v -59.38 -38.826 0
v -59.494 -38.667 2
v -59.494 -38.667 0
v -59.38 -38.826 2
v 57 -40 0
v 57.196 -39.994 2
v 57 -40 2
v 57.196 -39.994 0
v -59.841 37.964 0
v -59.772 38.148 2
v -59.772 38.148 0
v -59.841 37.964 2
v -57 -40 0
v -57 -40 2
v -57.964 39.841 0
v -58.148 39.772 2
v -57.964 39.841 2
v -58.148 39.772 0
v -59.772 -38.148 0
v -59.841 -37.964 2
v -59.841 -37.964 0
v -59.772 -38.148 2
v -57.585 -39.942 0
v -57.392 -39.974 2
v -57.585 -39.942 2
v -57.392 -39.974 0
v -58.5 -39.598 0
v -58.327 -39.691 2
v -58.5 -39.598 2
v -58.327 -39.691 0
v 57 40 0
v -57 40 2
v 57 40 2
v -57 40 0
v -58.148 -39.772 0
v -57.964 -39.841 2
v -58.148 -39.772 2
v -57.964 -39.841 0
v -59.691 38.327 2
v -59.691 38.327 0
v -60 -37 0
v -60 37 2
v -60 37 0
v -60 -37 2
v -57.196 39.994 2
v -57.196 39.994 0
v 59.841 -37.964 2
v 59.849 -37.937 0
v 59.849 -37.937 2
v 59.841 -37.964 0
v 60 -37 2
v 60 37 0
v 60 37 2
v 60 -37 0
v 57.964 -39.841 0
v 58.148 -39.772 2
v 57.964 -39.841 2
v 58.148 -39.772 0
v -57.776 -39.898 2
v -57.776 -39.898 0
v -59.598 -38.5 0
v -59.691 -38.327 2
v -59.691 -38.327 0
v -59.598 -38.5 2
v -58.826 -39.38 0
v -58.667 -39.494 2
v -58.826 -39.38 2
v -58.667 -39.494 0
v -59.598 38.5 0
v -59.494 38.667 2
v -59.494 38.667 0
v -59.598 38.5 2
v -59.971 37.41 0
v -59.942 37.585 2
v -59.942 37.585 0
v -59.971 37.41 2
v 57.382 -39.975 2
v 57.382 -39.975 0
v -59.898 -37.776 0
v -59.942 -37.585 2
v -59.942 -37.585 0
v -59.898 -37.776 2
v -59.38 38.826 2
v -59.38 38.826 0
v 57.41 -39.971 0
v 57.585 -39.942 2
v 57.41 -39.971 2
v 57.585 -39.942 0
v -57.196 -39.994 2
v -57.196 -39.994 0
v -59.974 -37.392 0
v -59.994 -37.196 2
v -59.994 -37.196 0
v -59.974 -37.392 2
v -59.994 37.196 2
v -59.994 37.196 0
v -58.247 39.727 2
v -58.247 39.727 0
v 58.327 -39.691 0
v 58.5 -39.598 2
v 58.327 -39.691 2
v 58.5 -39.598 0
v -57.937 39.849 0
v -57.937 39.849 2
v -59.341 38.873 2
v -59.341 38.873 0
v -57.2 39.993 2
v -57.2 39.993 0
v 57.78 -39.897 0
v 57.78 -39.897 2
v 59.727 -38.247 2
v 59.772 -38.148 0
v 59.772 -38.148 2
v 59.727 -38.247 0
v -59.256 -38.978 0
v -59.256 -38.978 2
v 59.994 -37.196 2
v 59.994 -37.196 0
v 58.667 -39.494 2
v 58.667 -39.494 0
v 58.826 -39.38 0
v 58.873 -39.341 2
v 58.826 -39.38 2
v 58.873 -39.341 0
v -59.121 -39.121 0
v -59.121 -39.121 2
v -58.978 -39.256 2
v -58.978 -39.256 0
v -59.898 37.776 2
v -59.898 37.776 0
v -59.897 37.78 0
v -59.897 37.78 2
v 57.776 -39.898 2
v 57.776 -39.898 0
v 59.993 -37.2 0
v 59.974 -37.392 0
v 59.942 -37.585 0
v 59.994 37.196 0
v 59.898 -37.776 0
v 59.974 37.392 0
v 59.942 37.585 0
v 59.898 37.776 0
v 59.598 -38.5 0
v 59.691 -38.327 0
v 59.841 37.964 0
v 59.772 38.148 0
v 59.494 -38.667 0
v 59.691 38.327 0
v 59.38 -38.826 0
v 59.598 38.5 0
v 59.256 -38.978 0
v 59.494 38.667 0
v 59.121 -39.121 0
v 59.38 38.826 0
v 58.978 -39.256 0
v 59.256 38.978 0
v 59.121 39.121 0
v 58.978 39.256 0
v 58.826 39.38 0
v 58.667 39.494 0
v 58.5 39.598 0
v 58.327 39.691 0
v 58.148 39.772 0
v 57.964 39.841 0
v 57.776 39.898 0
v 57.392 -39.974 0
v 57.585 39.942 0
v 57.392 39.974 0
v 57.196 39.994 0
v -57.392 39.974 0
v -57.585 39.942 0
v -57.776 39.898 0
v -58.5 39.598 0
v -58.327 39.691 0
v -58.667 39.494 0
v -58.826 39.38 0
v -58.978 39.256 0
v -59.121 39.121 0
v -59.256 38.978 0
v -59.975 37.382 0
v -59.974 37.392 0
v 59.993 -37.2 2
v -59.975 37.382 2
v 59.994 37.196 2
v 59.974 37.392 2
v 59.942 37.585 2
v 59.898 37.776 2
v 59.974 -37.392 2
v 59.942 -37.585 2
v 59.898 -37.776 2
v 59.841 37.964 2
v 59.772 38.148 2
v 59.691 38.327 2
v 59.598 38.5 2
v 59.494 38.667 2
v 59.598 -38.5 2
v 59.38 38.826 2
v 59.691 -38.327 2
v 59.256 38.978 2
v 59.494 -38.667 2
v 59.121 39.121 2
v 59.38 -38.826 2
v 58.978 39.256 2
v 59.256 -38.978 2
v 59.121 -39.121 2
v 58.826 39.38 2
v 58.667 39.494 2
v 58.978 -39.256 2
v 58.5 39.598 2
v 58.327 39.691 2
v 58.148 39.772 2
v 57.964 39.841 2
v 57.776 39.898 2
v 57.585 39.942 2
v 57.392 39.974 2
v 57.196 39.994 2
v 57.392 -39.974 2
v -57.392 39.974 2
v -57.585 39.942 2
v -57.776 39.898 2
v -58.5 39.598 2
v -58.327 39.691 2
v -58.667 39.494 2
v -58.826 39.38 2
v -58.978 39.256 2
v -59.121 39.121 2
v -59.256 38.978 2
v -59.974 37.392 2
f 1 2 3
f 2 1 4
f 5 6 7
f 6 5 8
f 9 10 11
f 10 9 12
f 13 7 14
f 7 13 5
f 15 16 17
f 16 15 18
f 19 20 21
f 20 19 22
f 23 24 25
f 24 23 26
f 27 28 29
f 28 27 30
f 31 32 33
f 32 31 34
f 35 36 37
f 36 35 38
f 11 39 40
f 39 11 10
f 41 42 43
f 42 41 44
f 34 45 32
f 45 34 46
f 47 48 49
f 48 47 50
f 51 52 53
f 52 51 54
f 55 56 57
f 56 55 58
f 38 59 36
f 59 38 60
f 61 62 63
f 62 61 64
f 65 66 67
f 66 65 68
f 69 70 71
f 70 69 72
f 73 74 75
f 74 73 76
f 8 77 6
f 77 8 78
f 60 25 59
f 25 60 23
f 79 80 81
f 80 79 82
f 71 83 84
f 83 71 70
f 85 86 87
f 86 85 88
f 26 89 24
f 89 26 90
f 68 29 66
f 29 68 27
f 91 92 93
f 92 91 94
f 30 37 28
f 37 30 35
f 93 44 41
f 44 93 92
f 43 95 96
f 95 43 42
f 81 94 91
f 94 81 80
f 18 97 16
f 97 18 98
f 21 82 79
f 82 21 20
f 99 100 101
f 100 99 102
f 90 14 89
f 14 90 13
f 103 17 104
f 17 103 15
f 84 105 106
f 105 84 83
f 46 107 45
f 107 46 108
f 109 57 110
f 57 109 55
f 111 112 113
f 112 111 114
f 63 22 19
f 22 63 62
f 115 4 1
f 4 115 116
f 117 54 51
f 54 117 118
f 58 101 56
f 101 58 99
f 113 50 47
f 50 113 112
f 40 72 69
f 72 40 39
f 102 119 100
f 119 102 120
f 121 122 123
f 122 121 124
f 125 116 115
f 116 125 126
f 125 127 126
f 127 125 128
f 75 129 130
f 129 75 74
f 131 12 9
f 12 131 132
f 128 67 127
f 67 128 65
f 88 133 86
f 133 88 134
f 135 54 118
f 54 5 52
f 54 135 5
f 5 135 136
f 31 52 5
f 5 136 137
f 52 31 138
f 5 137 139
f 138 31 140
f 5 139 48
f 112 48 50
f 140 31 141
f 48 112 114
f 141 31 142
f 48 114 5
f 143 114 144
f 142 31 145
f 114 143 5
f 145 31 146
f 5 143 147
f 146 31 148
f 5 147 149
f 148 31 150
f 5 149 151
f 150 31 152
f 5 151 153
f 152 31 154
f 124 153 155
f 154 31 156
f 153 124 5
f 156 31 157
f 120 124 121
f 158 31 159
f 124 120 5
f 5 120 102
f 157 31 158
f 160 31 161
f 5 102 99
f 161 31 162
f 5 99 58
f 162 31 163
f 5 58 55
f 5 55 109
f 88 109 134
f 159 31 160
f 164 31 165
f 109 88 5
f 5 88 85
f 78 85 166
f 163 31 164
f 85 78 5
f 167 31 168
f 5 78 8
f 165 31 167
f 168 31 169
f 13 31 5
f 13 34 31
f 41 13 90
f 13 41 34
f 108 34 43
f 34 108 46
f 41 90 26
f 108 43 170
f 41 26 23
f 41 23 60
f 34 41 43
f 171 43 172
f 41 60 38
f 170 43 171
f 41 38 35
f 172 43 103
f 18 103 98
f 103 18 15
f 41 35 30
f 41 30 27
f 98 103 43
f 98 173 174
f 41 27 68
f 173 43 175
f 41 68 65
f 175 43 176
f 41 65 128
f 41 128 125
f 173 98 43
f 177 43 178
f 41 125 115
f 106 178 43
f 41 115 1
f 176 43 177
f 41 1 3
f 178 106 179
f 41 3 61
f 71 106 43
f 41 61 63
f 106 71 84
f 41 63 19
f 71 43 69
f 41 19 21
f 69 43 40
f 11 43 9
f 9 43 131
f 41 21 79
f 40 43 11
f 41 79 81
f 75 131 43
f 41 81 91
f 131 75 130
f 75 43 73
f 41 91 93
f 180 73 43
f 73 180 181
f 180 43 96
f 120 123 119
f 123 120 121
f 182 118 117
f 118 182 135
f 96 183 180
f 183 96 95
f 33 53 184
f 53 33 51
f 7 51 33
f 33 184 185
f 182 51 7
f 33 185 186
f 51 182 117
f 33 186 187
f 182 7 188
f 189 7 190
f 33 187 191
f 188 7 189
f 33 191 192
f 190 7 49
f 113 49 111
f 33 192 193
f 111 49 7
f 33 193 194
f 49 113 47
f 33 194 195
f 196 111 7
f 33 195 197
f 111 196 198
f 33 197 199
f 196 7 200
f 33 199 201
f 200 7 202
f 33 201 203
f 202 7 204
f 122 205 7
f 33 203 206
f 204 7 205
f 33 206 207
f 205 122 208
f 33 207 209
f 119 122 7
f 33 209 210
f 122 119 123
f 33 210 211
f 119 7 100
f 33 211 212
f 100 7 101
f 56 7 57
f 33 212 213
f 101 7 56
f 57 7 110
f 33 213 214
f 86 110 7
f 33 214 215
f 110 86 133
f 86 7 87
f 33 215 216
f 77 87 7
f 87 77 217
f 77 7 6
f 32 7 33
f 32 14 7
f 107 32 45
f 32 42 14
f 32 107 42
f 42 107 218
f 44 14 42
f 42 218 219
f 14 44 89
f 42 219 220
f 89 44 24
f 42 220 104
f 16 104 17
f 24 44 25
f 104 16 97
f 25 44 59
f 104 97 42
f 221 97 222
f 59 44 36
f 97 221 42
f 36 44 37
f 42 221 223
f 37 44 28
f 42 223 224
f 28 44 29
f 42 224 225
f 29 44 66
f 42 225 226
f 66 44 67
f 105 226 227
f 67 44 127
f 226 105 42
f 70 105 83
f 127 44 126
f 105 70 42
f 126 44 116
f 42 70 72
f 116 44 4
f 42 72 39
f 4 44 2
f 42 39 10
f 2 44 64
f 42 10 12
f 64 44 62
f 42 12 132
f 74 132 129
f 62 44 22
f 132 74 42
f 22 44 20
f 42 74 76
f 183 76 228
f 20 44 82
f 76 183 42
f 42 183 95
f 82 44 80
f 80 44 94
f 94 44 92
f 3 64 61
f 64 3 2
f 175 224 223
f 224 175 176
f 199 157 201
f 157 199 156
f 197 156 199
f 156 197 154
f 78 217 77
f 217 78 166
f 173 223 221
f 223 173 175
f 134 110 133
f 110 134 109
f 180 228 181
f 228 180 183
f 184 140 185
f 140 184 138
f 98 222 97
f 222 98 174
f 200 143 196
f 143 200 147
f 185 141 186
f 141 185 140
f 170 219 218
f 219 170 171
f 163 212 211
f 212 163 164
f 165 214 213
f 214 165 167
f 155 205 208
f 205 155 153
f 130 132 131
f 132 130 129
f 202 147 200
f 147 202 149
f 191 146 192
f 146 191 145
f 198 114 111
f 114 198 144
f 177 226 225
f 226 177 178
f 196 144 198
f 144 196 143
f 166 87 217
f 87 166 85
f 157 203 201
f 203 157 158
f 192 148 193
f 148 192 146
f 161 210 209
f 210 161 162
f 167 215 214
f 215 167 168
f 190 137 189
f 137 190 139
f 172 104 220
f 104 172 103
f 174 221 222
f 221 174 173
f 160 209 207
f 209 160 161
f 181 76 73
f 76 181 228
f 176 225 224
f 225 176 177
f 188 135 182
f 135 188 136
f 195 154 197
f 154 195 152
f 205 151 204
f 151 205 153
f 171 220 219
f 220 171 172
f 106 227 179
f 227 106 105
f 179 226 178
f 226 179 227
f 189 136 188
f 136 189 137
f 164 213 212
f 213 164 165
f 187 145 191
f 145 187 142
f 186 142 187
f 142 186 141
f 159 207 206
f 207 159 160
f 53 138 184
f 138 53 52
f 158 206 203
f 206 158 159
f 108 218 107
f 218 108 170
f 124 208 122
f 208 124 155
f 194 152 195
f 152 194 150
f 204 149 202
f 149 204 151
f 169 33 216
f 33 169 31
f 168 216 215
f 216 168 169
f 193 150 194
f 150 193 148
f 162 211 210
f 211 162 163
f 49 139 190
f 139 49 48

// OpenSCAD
$fn = 96;

// Carbon fiber sheet parameters
sheet_len = 120;     // mm
sheet_wid = 80;      // mm
sheet_thk = 2.0;     // mm
corner_r  = 3.0;     // mm

// Visual appearance (approximate carbon fiber look)
cf_base = [0.08, 0.09, 0.10];
cf_dark = [0.03, 0.03, 0.035];
cf_mid  = [0.12, 0.13, 0.14];

module rounded_rect_2d(l, w, r){
    r2 = min(r, min(l, w)/2);
    hull() {
        translate([ r2,  r2]) circle(r=r2);
        translate([l-r2,  r2]) circle(r=r2);
        translate([ r2, w-r2]) circle(r=r2);
        translate([l-r2, w-r2]) circle(r=r2);
    }
}

module carbon_fiber_texture_2d(l, w, cell=6, stripe=1.2){
    // Base
    color(cf_base) square([l,w], center=false);

    // Diagonal weave approximation using clipped stripes
    intersection() {
        square([l,w], center=false);
        union() {
            // +45 deg stripes
            rotate(45)
            for (x = [-2*(l+w) : cell : 2*(l+w)]) {
                translate([x, -2*(l+w)])
                    color(cf_dark) square([stripe, 4*(l+w)], center=false);
            }
            // -45 deg stripes
            rotate(-45)
            for (x = [-2*(l+w) : cell : 2*(l+w)]) {
                translate([x, -2*(l+w)])
                    color(cf_mid) square([stripe, 4*(l+w)], center=false);
            }
        }
    }
}

module carbon_fiber_sheet(l, w, t, r){
    // Geometry
    difference() {
        linear_extrude(height=t)
            rounded_rect_2d(l, w, r);
    }

    // Top surface visual overlay (thin)
    translate([0,0,t-0.05])
    linear_extrude(height=0.05)
    intersection() {
        rounded_rect_2d(l, w, r);
        carbon_fiber_texture_2d(l, w, cell=6, stripe=1.2);
    }

    // Slight edge darkening
    color([0.02,0.02,0.025])
    difference() {
        linear_extrude(height=t)
            offset(delta=0.0) rounded_rect_2d(l, w, r);
        translate([0,0,0.02])
        linear_extrude(height=t-0.04)
            offset(delta=-0.6) rounded_rect_2d(l, w, r);
    }
}

// Center on origin
translate([-sheet_len/2, -sheet_wid/2, 0])
carbon_fiber_sheet(sheet_len, sheet_wid, sheet_thk, corner_r);
